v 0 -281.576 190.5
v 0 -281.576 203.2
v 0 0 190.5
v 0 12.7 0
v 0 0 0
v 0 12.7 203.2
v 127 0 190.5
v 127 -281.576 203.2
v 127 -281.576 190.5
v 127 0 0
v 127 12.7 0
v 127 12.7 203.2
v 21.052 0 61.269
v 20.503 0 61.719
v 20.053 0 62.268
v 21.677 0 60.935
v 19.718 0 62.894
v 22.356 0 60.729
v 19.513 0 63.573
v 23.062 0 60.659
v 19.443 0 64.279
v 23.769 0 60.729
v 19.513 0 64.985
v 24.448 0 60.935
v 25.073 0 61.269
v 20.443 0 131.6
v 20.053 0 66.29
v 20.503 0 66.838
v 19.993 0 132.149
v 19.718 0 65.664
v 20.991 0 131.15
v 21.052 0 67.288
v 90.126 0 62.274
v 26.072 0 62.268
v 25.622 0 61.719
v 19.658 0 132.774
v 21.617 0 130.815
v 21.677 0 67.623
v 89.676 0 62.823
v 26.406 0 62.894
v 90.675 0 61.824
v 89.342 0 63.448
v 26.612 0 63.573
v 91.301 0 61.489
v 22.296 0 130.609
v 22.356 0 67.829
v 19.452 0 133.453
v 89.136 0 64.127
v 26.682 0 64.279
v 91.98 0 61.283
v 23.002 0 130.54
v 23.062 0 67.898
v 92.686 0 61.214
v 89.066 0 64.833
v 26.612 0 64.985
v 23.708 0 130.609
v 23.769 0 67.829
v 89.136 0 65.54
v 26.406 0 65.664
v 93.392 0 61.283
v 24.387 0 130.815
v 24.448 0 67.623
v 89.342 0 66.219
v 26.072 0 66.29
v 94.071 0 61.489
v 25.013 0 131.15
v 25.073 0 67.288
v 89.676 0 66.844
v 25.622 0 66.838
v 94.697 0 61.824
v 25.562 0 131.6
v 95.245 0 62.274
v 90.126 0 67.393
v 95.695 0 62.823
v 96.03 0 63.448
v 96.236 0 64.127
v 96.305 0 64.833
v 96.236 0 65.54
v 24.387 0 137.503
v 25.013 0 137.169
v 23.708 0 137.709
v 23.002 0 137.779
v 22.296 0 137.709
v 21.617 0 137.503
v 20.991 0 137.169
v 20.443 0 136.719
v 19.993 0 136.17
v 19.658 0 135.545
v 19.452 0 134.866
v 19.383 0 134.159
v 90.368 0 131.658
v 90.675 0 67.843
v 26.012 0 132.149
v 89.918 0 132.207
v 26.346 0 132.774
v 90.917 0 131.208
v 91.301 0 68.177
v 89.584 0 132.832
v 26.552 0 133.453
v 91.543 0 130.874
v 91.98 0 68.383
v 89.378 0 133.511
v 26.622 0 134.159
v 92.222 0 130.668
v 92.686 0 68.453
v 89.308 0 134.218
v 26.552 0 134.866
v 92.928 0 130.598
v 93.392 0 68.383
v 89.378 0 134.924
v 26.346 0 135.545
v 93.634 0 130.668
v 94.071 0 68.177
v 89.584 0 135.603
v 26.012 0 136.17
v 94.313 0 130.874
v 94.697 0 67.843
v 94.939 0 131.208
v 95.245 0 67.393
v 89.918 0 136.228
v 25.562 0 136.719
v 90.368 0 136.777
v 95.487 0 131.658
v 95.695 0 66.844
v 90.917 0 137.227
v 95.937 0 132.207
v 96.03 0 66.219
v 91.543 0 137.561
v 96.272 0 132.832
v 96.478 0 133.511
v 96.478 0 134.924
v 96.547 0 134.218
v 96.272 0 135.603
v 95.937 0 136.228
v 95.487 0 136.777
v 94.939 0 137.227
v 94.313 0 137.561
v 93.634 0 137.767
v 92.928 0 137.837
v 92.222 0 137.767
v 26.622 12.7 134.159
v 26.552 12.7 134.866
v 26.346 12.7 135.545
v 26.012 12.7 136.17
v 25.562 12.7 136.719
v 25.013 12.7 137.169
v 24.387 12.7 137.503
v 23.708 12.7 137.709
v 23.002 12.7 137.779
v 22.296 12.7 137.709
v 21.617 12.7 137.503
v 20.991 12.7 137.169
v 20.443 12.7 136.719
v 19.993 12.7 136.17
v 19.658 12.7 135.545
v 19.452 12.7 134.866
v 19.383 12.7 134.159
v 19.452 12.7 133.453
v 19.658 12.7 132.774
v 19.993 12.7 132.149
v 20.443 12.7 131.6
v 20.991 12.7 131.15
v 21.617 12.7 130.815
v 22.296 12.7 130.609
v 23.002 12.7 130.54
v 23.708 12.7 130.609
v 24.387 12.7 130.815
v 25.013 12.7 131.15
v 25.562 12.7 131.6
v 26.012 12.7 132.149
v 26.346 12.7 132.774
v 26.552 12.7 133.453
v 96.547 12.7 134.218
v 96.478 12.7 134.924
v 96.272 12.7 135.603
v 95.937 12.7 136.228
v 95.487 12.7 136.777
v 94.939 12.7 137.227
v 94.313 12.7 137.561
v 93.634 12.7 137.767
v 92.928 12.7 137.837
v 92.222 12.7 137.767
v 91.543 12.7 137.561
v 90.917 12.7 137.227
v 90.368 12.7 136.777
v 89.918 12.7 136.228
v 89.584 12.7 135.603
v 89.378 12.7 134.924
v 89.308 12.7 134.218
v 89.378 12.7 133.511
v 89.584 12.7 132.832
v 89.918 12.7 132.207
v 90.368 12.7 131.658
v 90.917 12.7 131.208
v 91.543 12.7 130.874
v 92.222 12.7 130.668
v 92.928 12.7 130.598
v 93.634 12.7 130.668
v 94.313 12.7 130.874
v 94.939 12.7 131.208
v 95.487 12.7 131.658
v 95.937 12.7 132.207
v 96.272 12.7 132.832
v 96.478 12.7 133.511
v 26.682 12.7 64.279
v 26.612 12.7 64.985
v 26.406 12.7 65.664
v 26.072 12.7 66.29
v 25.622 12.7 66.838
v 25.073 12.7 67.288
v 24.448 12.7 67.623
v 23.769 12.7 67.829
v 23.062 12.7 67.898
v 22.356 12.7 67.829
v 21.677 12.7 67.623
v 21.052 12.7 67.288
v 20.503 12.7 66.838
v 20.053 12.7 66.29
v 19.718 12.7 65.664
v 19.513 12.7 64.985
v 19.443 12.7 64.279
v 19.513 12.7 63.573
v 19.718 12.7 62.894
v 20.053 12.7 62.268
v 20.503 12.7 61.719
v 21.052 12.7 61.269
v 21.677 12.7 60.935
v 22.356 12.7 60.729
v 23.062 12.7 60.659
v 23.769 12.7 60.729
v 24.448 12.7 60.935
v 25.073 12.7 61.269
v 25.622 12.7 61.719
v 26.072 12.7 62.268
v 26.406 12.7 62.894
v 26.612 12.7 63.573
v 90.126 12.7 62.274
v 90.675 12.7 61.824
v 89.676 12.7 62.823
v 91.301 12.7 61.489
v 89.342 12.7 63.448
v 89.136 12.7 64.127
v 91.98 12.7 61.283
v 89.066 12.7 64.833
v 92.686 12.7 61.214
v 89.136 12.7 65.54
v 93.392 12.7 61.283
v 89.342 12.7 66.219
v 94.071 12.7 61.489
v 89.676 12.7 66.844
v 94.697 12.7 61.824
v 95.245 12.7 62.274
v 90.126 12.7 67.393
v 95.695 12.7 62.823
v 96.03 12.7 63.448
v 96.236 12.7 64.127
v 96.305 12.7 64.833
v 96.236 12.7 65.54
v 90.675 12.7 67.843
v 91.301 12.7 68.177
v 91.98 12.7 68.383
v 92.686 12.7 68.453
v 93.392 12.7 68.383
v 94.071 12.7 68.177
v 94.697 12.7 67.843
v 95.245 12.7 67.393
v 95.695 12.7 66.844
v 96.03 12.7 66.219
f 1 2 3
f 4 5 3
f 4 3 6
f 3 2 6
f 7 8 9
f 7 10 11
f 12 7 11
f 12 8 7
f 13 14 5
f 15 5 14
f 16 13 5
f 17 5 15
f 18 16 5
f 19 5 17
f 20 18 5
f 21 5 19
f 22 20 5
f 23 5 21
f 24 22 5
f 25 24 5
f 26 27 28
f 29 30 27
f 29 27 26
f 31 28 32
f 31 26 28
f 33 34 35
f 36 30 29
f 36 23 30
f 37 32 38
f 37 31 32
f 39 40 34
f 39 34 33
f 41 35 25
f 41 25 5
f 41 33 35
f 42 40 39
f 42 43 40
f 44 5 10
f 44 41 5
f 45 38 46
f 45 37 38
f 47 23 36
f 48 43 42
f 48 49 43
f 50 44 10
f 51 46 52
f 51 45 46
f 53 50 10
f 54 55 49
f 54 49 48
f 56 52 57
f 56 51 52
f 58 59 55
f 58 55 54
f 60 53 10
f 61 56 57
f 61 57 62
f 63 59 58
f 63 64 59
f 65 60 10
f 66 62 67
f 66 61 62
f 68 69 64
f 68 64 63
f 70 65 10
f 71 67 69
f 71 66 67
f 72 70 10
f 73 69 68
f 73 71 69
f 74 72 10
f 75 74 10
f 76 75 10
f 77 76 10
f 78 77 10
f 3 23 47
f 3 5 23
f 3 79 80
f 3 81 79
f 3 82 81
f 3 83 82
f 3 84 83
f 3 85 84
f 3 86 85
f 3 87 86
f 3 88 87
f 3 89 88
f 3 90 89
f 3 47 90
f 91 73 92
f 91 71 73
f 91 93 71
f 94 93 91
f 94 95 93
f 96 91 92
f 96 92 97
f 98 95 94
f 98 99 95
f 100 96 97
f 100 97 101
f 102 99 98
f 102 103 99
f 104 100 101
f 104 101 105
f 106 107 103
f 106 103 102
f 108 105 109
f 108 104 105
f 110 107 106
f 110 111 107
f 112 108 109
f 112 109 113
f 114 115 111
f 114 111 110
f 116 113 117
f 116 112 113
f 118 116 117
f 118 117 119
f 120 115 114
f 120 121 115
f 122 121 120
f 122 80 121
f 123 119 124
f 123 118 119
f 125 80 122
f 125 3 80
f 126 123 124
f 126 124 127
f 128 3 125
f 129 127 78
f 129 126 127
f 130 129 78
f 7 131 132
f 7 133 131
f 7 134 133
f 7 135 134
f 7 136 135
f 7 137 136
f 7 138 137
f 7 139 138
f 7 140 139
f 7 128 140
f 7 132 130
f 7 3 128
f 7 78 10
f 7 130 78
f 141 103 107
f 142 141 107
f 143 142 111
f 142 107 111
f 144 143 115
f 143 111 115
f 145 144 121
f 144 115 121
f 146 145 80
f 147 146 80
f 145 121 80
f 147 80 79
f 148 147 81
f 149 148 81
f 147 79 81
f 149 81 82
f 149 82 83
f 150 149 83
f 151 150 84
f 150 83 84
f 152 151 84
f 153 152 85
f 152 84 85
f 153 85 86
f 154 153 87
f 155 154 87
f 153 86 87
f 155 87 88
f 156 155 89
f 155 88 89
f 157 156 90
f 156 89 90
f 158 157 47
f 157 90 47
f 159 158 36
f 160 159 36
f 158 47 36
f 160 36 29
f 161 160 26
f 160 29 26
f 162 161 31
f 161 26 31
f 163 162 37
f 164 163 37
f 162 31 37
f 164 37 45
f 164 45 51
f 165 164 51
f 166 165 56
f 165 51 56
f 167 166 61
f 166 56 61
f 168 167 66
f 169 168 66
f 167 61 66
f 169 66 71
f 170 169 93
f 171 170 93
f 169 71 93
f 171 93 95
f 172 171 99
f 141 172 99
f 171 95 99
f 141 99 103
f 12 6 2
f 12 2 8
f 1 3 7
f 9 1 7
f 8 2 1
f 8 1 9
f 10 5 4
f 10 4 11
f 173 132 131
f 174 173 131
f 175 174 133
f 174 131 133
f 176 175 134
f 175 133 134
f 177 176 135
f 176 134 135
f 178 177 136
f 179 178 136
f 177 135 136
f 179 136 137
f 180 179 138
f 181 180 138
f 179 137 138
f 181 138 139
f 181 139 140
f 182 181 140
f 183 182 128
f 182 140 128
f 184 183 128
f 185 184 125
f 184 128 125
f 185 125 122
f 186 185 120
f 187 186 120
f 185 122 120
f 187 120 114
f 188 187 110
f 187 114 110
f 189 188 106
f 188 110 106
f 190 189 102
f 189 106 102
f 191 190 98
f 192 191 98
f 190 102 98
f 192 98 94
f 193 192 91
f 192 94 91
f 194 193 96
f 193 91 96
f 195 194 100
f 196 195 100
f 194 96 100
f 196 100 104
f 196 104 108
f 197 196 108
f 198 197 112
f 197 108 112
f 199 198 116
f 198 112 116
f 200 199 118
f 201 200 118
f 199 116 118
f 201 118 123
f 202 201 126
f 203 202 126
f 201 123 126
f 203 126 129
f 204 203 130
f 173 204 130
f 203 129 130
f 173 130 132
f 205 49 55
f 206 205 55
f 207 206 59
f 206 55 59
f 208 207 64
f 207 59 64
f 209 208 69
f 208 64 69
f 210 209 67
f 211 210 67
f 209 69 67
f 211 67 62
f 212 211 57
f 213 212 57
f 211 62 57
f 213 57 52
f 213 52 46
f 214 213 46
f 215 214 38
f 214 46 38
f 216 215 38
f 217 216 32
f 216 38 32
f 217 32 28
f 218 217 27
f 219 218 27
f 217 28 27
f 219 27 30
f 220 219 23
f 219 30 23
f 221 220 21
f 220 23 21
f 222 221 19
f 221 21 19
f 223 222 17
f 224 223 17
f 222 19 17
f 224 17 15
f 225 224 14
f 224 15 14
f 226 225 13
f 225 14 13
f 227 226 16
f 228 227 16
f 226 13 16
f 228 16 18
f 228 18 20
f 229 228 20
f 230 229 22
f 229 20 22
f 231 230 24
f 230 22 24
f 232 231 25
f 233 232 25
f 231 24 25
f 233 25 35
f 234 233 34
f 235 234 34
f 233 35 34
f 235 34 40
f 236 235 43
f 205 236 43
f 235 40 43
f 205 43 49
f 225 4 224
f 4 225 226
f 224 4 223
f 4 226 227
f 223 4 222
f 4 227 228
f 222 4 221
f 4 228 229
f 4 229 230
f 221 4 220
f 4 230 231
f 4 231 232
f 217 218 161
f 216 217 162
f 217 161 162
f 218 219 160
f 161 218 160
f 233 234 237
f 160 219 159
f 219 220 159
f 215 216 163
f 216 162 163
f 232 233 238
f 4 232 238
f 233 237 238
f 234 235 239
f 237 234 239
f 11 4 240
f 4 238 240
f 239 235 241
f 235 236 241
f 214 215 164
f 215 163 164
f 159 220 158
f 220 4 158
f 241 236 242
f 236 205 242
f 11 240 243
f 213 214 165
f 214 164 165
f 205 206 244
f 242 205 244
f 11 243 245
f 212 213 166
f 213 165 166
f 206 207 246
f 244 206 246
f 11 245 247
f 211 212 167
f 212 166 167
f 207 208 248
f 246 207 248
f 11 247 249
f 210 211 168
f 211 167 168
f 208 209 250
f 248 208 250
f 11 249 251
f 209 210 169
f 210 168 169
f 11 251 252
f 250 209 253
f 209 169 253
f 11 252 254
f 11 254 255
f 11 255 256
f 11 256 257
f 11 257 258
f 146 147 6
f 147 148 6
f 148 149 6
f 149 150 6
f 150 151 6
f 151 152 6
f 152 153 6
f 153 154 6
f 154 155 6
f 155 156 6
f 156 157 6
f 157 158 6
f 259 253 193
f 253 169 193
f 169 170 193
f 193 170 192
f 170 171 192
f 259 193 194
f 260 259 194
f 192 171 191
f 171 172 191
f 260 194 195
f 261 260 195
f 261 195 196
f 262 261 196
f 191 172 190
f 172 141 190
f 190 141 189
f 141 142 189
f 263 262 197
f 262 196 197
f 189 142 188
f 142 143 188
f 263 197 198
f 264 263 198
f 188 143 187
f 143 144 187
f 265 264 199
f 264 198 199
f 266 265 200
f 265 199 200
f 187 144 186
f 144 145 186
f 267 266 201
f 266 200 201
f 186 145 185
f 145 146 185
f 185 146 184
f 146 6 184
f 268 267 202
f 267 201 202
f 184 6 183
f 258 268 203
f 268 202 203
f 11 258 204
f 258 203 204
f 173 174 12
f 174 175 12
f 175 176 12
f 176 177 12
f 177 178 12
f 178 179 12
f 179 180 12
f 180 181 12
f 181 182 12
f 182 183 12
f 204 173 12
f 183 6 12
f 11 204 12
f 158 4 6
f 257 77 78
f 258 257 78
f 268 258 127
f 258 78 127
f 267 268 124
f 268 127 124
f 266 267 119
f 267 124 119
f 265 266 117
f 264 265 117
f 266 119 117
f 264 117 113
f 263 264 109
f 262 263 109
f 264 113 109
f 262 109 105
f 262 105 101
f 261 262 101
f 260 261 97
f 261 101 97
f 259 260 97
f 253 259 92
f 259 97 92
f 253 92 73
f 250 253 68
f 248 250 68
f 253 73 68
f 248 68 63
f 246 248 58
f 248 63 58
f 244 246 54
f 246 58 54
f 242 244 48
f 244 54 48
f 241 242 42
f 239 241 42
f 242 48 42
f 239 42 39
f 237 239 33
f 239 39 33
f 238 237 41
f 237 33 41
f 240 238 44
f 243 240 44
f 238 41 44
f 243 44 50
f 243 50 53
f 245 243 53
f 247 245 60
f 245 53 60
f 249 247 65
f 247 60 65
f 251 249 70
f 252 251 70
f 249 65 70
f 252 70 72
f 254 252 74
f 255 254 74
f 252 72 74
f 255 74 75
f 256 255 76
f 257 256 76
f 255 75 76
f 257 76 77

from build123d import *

# Parameters (mm, degrees)
F0_W      = 127
F0_H      = 203.2
F1_DEPTH  = 12.7
F2_W      = 127
F2_H      = 281.5760534146
F3_DEPTH  = 12.7
F4_R      = 3.6195
F5_DEPTH  = 12.7
F6_R      = 3.6195
F7_DEPTH  = 12.7
F8_R      = 3.6195
F9_DEPTH  = 12.7
F10_R     = 3.6195
F11_DEPTH = 12.7


with BuildPart() as f1:
    # F0 (on Front) → F1 (new body)
    with BuildSketch(Plane.XZ):
        with Locations((63.5, 101.6)):
            Rectangle(F0_W, F0_H)
    extrude(amount=-F1_DEPTH)

    # F2 (on face) → F3 (join)
    with BuildSketch(Plane.XY.offset(203.2)):
        with Locations((63.5, -140.7880267073)):
            Rectangle(F2_W, F2_H)
    extrude(amount=-F3_DEPTH)

    # F4 (on face) → F5 (cut)
    with BuildSketch(Plane.XZ):
        with Locations((92.6856547594, 64.833432436)):
            Circle(F4_R)
    extrude(amount=-F5_DEPTH, mode=Mode.SUBTRACT)

    # F6 (on face) → F7 (cut)
    with BuildSketch(Plane.XZ):
        with Locations((92.9278507829, 134.2175006866)):
            Circle(F6_R)
    extrude(amount=-F7_DEPTH, mode=Mode.SUBTRACT)

    # F8 (on face) → F9 (cut)
    with BuildSketch(Plane.XZ):
        with Locations((23.0624806136, 64.2787441611)):
            Circle(F8_R)
    extrude(amount=-F9_DEPTH, mode=Mode.SUBTRACT)

    # F10 (on face) → F11 (cut)
    with BuildSketch(Plane.XZ):
        with Locations((23.0022147298, 134.1594159603)):
            Circle(F10_R)
    extrude(amount=-F11_DEPTH, mode=Mode.SUBTRACT)


solid = f1.part
